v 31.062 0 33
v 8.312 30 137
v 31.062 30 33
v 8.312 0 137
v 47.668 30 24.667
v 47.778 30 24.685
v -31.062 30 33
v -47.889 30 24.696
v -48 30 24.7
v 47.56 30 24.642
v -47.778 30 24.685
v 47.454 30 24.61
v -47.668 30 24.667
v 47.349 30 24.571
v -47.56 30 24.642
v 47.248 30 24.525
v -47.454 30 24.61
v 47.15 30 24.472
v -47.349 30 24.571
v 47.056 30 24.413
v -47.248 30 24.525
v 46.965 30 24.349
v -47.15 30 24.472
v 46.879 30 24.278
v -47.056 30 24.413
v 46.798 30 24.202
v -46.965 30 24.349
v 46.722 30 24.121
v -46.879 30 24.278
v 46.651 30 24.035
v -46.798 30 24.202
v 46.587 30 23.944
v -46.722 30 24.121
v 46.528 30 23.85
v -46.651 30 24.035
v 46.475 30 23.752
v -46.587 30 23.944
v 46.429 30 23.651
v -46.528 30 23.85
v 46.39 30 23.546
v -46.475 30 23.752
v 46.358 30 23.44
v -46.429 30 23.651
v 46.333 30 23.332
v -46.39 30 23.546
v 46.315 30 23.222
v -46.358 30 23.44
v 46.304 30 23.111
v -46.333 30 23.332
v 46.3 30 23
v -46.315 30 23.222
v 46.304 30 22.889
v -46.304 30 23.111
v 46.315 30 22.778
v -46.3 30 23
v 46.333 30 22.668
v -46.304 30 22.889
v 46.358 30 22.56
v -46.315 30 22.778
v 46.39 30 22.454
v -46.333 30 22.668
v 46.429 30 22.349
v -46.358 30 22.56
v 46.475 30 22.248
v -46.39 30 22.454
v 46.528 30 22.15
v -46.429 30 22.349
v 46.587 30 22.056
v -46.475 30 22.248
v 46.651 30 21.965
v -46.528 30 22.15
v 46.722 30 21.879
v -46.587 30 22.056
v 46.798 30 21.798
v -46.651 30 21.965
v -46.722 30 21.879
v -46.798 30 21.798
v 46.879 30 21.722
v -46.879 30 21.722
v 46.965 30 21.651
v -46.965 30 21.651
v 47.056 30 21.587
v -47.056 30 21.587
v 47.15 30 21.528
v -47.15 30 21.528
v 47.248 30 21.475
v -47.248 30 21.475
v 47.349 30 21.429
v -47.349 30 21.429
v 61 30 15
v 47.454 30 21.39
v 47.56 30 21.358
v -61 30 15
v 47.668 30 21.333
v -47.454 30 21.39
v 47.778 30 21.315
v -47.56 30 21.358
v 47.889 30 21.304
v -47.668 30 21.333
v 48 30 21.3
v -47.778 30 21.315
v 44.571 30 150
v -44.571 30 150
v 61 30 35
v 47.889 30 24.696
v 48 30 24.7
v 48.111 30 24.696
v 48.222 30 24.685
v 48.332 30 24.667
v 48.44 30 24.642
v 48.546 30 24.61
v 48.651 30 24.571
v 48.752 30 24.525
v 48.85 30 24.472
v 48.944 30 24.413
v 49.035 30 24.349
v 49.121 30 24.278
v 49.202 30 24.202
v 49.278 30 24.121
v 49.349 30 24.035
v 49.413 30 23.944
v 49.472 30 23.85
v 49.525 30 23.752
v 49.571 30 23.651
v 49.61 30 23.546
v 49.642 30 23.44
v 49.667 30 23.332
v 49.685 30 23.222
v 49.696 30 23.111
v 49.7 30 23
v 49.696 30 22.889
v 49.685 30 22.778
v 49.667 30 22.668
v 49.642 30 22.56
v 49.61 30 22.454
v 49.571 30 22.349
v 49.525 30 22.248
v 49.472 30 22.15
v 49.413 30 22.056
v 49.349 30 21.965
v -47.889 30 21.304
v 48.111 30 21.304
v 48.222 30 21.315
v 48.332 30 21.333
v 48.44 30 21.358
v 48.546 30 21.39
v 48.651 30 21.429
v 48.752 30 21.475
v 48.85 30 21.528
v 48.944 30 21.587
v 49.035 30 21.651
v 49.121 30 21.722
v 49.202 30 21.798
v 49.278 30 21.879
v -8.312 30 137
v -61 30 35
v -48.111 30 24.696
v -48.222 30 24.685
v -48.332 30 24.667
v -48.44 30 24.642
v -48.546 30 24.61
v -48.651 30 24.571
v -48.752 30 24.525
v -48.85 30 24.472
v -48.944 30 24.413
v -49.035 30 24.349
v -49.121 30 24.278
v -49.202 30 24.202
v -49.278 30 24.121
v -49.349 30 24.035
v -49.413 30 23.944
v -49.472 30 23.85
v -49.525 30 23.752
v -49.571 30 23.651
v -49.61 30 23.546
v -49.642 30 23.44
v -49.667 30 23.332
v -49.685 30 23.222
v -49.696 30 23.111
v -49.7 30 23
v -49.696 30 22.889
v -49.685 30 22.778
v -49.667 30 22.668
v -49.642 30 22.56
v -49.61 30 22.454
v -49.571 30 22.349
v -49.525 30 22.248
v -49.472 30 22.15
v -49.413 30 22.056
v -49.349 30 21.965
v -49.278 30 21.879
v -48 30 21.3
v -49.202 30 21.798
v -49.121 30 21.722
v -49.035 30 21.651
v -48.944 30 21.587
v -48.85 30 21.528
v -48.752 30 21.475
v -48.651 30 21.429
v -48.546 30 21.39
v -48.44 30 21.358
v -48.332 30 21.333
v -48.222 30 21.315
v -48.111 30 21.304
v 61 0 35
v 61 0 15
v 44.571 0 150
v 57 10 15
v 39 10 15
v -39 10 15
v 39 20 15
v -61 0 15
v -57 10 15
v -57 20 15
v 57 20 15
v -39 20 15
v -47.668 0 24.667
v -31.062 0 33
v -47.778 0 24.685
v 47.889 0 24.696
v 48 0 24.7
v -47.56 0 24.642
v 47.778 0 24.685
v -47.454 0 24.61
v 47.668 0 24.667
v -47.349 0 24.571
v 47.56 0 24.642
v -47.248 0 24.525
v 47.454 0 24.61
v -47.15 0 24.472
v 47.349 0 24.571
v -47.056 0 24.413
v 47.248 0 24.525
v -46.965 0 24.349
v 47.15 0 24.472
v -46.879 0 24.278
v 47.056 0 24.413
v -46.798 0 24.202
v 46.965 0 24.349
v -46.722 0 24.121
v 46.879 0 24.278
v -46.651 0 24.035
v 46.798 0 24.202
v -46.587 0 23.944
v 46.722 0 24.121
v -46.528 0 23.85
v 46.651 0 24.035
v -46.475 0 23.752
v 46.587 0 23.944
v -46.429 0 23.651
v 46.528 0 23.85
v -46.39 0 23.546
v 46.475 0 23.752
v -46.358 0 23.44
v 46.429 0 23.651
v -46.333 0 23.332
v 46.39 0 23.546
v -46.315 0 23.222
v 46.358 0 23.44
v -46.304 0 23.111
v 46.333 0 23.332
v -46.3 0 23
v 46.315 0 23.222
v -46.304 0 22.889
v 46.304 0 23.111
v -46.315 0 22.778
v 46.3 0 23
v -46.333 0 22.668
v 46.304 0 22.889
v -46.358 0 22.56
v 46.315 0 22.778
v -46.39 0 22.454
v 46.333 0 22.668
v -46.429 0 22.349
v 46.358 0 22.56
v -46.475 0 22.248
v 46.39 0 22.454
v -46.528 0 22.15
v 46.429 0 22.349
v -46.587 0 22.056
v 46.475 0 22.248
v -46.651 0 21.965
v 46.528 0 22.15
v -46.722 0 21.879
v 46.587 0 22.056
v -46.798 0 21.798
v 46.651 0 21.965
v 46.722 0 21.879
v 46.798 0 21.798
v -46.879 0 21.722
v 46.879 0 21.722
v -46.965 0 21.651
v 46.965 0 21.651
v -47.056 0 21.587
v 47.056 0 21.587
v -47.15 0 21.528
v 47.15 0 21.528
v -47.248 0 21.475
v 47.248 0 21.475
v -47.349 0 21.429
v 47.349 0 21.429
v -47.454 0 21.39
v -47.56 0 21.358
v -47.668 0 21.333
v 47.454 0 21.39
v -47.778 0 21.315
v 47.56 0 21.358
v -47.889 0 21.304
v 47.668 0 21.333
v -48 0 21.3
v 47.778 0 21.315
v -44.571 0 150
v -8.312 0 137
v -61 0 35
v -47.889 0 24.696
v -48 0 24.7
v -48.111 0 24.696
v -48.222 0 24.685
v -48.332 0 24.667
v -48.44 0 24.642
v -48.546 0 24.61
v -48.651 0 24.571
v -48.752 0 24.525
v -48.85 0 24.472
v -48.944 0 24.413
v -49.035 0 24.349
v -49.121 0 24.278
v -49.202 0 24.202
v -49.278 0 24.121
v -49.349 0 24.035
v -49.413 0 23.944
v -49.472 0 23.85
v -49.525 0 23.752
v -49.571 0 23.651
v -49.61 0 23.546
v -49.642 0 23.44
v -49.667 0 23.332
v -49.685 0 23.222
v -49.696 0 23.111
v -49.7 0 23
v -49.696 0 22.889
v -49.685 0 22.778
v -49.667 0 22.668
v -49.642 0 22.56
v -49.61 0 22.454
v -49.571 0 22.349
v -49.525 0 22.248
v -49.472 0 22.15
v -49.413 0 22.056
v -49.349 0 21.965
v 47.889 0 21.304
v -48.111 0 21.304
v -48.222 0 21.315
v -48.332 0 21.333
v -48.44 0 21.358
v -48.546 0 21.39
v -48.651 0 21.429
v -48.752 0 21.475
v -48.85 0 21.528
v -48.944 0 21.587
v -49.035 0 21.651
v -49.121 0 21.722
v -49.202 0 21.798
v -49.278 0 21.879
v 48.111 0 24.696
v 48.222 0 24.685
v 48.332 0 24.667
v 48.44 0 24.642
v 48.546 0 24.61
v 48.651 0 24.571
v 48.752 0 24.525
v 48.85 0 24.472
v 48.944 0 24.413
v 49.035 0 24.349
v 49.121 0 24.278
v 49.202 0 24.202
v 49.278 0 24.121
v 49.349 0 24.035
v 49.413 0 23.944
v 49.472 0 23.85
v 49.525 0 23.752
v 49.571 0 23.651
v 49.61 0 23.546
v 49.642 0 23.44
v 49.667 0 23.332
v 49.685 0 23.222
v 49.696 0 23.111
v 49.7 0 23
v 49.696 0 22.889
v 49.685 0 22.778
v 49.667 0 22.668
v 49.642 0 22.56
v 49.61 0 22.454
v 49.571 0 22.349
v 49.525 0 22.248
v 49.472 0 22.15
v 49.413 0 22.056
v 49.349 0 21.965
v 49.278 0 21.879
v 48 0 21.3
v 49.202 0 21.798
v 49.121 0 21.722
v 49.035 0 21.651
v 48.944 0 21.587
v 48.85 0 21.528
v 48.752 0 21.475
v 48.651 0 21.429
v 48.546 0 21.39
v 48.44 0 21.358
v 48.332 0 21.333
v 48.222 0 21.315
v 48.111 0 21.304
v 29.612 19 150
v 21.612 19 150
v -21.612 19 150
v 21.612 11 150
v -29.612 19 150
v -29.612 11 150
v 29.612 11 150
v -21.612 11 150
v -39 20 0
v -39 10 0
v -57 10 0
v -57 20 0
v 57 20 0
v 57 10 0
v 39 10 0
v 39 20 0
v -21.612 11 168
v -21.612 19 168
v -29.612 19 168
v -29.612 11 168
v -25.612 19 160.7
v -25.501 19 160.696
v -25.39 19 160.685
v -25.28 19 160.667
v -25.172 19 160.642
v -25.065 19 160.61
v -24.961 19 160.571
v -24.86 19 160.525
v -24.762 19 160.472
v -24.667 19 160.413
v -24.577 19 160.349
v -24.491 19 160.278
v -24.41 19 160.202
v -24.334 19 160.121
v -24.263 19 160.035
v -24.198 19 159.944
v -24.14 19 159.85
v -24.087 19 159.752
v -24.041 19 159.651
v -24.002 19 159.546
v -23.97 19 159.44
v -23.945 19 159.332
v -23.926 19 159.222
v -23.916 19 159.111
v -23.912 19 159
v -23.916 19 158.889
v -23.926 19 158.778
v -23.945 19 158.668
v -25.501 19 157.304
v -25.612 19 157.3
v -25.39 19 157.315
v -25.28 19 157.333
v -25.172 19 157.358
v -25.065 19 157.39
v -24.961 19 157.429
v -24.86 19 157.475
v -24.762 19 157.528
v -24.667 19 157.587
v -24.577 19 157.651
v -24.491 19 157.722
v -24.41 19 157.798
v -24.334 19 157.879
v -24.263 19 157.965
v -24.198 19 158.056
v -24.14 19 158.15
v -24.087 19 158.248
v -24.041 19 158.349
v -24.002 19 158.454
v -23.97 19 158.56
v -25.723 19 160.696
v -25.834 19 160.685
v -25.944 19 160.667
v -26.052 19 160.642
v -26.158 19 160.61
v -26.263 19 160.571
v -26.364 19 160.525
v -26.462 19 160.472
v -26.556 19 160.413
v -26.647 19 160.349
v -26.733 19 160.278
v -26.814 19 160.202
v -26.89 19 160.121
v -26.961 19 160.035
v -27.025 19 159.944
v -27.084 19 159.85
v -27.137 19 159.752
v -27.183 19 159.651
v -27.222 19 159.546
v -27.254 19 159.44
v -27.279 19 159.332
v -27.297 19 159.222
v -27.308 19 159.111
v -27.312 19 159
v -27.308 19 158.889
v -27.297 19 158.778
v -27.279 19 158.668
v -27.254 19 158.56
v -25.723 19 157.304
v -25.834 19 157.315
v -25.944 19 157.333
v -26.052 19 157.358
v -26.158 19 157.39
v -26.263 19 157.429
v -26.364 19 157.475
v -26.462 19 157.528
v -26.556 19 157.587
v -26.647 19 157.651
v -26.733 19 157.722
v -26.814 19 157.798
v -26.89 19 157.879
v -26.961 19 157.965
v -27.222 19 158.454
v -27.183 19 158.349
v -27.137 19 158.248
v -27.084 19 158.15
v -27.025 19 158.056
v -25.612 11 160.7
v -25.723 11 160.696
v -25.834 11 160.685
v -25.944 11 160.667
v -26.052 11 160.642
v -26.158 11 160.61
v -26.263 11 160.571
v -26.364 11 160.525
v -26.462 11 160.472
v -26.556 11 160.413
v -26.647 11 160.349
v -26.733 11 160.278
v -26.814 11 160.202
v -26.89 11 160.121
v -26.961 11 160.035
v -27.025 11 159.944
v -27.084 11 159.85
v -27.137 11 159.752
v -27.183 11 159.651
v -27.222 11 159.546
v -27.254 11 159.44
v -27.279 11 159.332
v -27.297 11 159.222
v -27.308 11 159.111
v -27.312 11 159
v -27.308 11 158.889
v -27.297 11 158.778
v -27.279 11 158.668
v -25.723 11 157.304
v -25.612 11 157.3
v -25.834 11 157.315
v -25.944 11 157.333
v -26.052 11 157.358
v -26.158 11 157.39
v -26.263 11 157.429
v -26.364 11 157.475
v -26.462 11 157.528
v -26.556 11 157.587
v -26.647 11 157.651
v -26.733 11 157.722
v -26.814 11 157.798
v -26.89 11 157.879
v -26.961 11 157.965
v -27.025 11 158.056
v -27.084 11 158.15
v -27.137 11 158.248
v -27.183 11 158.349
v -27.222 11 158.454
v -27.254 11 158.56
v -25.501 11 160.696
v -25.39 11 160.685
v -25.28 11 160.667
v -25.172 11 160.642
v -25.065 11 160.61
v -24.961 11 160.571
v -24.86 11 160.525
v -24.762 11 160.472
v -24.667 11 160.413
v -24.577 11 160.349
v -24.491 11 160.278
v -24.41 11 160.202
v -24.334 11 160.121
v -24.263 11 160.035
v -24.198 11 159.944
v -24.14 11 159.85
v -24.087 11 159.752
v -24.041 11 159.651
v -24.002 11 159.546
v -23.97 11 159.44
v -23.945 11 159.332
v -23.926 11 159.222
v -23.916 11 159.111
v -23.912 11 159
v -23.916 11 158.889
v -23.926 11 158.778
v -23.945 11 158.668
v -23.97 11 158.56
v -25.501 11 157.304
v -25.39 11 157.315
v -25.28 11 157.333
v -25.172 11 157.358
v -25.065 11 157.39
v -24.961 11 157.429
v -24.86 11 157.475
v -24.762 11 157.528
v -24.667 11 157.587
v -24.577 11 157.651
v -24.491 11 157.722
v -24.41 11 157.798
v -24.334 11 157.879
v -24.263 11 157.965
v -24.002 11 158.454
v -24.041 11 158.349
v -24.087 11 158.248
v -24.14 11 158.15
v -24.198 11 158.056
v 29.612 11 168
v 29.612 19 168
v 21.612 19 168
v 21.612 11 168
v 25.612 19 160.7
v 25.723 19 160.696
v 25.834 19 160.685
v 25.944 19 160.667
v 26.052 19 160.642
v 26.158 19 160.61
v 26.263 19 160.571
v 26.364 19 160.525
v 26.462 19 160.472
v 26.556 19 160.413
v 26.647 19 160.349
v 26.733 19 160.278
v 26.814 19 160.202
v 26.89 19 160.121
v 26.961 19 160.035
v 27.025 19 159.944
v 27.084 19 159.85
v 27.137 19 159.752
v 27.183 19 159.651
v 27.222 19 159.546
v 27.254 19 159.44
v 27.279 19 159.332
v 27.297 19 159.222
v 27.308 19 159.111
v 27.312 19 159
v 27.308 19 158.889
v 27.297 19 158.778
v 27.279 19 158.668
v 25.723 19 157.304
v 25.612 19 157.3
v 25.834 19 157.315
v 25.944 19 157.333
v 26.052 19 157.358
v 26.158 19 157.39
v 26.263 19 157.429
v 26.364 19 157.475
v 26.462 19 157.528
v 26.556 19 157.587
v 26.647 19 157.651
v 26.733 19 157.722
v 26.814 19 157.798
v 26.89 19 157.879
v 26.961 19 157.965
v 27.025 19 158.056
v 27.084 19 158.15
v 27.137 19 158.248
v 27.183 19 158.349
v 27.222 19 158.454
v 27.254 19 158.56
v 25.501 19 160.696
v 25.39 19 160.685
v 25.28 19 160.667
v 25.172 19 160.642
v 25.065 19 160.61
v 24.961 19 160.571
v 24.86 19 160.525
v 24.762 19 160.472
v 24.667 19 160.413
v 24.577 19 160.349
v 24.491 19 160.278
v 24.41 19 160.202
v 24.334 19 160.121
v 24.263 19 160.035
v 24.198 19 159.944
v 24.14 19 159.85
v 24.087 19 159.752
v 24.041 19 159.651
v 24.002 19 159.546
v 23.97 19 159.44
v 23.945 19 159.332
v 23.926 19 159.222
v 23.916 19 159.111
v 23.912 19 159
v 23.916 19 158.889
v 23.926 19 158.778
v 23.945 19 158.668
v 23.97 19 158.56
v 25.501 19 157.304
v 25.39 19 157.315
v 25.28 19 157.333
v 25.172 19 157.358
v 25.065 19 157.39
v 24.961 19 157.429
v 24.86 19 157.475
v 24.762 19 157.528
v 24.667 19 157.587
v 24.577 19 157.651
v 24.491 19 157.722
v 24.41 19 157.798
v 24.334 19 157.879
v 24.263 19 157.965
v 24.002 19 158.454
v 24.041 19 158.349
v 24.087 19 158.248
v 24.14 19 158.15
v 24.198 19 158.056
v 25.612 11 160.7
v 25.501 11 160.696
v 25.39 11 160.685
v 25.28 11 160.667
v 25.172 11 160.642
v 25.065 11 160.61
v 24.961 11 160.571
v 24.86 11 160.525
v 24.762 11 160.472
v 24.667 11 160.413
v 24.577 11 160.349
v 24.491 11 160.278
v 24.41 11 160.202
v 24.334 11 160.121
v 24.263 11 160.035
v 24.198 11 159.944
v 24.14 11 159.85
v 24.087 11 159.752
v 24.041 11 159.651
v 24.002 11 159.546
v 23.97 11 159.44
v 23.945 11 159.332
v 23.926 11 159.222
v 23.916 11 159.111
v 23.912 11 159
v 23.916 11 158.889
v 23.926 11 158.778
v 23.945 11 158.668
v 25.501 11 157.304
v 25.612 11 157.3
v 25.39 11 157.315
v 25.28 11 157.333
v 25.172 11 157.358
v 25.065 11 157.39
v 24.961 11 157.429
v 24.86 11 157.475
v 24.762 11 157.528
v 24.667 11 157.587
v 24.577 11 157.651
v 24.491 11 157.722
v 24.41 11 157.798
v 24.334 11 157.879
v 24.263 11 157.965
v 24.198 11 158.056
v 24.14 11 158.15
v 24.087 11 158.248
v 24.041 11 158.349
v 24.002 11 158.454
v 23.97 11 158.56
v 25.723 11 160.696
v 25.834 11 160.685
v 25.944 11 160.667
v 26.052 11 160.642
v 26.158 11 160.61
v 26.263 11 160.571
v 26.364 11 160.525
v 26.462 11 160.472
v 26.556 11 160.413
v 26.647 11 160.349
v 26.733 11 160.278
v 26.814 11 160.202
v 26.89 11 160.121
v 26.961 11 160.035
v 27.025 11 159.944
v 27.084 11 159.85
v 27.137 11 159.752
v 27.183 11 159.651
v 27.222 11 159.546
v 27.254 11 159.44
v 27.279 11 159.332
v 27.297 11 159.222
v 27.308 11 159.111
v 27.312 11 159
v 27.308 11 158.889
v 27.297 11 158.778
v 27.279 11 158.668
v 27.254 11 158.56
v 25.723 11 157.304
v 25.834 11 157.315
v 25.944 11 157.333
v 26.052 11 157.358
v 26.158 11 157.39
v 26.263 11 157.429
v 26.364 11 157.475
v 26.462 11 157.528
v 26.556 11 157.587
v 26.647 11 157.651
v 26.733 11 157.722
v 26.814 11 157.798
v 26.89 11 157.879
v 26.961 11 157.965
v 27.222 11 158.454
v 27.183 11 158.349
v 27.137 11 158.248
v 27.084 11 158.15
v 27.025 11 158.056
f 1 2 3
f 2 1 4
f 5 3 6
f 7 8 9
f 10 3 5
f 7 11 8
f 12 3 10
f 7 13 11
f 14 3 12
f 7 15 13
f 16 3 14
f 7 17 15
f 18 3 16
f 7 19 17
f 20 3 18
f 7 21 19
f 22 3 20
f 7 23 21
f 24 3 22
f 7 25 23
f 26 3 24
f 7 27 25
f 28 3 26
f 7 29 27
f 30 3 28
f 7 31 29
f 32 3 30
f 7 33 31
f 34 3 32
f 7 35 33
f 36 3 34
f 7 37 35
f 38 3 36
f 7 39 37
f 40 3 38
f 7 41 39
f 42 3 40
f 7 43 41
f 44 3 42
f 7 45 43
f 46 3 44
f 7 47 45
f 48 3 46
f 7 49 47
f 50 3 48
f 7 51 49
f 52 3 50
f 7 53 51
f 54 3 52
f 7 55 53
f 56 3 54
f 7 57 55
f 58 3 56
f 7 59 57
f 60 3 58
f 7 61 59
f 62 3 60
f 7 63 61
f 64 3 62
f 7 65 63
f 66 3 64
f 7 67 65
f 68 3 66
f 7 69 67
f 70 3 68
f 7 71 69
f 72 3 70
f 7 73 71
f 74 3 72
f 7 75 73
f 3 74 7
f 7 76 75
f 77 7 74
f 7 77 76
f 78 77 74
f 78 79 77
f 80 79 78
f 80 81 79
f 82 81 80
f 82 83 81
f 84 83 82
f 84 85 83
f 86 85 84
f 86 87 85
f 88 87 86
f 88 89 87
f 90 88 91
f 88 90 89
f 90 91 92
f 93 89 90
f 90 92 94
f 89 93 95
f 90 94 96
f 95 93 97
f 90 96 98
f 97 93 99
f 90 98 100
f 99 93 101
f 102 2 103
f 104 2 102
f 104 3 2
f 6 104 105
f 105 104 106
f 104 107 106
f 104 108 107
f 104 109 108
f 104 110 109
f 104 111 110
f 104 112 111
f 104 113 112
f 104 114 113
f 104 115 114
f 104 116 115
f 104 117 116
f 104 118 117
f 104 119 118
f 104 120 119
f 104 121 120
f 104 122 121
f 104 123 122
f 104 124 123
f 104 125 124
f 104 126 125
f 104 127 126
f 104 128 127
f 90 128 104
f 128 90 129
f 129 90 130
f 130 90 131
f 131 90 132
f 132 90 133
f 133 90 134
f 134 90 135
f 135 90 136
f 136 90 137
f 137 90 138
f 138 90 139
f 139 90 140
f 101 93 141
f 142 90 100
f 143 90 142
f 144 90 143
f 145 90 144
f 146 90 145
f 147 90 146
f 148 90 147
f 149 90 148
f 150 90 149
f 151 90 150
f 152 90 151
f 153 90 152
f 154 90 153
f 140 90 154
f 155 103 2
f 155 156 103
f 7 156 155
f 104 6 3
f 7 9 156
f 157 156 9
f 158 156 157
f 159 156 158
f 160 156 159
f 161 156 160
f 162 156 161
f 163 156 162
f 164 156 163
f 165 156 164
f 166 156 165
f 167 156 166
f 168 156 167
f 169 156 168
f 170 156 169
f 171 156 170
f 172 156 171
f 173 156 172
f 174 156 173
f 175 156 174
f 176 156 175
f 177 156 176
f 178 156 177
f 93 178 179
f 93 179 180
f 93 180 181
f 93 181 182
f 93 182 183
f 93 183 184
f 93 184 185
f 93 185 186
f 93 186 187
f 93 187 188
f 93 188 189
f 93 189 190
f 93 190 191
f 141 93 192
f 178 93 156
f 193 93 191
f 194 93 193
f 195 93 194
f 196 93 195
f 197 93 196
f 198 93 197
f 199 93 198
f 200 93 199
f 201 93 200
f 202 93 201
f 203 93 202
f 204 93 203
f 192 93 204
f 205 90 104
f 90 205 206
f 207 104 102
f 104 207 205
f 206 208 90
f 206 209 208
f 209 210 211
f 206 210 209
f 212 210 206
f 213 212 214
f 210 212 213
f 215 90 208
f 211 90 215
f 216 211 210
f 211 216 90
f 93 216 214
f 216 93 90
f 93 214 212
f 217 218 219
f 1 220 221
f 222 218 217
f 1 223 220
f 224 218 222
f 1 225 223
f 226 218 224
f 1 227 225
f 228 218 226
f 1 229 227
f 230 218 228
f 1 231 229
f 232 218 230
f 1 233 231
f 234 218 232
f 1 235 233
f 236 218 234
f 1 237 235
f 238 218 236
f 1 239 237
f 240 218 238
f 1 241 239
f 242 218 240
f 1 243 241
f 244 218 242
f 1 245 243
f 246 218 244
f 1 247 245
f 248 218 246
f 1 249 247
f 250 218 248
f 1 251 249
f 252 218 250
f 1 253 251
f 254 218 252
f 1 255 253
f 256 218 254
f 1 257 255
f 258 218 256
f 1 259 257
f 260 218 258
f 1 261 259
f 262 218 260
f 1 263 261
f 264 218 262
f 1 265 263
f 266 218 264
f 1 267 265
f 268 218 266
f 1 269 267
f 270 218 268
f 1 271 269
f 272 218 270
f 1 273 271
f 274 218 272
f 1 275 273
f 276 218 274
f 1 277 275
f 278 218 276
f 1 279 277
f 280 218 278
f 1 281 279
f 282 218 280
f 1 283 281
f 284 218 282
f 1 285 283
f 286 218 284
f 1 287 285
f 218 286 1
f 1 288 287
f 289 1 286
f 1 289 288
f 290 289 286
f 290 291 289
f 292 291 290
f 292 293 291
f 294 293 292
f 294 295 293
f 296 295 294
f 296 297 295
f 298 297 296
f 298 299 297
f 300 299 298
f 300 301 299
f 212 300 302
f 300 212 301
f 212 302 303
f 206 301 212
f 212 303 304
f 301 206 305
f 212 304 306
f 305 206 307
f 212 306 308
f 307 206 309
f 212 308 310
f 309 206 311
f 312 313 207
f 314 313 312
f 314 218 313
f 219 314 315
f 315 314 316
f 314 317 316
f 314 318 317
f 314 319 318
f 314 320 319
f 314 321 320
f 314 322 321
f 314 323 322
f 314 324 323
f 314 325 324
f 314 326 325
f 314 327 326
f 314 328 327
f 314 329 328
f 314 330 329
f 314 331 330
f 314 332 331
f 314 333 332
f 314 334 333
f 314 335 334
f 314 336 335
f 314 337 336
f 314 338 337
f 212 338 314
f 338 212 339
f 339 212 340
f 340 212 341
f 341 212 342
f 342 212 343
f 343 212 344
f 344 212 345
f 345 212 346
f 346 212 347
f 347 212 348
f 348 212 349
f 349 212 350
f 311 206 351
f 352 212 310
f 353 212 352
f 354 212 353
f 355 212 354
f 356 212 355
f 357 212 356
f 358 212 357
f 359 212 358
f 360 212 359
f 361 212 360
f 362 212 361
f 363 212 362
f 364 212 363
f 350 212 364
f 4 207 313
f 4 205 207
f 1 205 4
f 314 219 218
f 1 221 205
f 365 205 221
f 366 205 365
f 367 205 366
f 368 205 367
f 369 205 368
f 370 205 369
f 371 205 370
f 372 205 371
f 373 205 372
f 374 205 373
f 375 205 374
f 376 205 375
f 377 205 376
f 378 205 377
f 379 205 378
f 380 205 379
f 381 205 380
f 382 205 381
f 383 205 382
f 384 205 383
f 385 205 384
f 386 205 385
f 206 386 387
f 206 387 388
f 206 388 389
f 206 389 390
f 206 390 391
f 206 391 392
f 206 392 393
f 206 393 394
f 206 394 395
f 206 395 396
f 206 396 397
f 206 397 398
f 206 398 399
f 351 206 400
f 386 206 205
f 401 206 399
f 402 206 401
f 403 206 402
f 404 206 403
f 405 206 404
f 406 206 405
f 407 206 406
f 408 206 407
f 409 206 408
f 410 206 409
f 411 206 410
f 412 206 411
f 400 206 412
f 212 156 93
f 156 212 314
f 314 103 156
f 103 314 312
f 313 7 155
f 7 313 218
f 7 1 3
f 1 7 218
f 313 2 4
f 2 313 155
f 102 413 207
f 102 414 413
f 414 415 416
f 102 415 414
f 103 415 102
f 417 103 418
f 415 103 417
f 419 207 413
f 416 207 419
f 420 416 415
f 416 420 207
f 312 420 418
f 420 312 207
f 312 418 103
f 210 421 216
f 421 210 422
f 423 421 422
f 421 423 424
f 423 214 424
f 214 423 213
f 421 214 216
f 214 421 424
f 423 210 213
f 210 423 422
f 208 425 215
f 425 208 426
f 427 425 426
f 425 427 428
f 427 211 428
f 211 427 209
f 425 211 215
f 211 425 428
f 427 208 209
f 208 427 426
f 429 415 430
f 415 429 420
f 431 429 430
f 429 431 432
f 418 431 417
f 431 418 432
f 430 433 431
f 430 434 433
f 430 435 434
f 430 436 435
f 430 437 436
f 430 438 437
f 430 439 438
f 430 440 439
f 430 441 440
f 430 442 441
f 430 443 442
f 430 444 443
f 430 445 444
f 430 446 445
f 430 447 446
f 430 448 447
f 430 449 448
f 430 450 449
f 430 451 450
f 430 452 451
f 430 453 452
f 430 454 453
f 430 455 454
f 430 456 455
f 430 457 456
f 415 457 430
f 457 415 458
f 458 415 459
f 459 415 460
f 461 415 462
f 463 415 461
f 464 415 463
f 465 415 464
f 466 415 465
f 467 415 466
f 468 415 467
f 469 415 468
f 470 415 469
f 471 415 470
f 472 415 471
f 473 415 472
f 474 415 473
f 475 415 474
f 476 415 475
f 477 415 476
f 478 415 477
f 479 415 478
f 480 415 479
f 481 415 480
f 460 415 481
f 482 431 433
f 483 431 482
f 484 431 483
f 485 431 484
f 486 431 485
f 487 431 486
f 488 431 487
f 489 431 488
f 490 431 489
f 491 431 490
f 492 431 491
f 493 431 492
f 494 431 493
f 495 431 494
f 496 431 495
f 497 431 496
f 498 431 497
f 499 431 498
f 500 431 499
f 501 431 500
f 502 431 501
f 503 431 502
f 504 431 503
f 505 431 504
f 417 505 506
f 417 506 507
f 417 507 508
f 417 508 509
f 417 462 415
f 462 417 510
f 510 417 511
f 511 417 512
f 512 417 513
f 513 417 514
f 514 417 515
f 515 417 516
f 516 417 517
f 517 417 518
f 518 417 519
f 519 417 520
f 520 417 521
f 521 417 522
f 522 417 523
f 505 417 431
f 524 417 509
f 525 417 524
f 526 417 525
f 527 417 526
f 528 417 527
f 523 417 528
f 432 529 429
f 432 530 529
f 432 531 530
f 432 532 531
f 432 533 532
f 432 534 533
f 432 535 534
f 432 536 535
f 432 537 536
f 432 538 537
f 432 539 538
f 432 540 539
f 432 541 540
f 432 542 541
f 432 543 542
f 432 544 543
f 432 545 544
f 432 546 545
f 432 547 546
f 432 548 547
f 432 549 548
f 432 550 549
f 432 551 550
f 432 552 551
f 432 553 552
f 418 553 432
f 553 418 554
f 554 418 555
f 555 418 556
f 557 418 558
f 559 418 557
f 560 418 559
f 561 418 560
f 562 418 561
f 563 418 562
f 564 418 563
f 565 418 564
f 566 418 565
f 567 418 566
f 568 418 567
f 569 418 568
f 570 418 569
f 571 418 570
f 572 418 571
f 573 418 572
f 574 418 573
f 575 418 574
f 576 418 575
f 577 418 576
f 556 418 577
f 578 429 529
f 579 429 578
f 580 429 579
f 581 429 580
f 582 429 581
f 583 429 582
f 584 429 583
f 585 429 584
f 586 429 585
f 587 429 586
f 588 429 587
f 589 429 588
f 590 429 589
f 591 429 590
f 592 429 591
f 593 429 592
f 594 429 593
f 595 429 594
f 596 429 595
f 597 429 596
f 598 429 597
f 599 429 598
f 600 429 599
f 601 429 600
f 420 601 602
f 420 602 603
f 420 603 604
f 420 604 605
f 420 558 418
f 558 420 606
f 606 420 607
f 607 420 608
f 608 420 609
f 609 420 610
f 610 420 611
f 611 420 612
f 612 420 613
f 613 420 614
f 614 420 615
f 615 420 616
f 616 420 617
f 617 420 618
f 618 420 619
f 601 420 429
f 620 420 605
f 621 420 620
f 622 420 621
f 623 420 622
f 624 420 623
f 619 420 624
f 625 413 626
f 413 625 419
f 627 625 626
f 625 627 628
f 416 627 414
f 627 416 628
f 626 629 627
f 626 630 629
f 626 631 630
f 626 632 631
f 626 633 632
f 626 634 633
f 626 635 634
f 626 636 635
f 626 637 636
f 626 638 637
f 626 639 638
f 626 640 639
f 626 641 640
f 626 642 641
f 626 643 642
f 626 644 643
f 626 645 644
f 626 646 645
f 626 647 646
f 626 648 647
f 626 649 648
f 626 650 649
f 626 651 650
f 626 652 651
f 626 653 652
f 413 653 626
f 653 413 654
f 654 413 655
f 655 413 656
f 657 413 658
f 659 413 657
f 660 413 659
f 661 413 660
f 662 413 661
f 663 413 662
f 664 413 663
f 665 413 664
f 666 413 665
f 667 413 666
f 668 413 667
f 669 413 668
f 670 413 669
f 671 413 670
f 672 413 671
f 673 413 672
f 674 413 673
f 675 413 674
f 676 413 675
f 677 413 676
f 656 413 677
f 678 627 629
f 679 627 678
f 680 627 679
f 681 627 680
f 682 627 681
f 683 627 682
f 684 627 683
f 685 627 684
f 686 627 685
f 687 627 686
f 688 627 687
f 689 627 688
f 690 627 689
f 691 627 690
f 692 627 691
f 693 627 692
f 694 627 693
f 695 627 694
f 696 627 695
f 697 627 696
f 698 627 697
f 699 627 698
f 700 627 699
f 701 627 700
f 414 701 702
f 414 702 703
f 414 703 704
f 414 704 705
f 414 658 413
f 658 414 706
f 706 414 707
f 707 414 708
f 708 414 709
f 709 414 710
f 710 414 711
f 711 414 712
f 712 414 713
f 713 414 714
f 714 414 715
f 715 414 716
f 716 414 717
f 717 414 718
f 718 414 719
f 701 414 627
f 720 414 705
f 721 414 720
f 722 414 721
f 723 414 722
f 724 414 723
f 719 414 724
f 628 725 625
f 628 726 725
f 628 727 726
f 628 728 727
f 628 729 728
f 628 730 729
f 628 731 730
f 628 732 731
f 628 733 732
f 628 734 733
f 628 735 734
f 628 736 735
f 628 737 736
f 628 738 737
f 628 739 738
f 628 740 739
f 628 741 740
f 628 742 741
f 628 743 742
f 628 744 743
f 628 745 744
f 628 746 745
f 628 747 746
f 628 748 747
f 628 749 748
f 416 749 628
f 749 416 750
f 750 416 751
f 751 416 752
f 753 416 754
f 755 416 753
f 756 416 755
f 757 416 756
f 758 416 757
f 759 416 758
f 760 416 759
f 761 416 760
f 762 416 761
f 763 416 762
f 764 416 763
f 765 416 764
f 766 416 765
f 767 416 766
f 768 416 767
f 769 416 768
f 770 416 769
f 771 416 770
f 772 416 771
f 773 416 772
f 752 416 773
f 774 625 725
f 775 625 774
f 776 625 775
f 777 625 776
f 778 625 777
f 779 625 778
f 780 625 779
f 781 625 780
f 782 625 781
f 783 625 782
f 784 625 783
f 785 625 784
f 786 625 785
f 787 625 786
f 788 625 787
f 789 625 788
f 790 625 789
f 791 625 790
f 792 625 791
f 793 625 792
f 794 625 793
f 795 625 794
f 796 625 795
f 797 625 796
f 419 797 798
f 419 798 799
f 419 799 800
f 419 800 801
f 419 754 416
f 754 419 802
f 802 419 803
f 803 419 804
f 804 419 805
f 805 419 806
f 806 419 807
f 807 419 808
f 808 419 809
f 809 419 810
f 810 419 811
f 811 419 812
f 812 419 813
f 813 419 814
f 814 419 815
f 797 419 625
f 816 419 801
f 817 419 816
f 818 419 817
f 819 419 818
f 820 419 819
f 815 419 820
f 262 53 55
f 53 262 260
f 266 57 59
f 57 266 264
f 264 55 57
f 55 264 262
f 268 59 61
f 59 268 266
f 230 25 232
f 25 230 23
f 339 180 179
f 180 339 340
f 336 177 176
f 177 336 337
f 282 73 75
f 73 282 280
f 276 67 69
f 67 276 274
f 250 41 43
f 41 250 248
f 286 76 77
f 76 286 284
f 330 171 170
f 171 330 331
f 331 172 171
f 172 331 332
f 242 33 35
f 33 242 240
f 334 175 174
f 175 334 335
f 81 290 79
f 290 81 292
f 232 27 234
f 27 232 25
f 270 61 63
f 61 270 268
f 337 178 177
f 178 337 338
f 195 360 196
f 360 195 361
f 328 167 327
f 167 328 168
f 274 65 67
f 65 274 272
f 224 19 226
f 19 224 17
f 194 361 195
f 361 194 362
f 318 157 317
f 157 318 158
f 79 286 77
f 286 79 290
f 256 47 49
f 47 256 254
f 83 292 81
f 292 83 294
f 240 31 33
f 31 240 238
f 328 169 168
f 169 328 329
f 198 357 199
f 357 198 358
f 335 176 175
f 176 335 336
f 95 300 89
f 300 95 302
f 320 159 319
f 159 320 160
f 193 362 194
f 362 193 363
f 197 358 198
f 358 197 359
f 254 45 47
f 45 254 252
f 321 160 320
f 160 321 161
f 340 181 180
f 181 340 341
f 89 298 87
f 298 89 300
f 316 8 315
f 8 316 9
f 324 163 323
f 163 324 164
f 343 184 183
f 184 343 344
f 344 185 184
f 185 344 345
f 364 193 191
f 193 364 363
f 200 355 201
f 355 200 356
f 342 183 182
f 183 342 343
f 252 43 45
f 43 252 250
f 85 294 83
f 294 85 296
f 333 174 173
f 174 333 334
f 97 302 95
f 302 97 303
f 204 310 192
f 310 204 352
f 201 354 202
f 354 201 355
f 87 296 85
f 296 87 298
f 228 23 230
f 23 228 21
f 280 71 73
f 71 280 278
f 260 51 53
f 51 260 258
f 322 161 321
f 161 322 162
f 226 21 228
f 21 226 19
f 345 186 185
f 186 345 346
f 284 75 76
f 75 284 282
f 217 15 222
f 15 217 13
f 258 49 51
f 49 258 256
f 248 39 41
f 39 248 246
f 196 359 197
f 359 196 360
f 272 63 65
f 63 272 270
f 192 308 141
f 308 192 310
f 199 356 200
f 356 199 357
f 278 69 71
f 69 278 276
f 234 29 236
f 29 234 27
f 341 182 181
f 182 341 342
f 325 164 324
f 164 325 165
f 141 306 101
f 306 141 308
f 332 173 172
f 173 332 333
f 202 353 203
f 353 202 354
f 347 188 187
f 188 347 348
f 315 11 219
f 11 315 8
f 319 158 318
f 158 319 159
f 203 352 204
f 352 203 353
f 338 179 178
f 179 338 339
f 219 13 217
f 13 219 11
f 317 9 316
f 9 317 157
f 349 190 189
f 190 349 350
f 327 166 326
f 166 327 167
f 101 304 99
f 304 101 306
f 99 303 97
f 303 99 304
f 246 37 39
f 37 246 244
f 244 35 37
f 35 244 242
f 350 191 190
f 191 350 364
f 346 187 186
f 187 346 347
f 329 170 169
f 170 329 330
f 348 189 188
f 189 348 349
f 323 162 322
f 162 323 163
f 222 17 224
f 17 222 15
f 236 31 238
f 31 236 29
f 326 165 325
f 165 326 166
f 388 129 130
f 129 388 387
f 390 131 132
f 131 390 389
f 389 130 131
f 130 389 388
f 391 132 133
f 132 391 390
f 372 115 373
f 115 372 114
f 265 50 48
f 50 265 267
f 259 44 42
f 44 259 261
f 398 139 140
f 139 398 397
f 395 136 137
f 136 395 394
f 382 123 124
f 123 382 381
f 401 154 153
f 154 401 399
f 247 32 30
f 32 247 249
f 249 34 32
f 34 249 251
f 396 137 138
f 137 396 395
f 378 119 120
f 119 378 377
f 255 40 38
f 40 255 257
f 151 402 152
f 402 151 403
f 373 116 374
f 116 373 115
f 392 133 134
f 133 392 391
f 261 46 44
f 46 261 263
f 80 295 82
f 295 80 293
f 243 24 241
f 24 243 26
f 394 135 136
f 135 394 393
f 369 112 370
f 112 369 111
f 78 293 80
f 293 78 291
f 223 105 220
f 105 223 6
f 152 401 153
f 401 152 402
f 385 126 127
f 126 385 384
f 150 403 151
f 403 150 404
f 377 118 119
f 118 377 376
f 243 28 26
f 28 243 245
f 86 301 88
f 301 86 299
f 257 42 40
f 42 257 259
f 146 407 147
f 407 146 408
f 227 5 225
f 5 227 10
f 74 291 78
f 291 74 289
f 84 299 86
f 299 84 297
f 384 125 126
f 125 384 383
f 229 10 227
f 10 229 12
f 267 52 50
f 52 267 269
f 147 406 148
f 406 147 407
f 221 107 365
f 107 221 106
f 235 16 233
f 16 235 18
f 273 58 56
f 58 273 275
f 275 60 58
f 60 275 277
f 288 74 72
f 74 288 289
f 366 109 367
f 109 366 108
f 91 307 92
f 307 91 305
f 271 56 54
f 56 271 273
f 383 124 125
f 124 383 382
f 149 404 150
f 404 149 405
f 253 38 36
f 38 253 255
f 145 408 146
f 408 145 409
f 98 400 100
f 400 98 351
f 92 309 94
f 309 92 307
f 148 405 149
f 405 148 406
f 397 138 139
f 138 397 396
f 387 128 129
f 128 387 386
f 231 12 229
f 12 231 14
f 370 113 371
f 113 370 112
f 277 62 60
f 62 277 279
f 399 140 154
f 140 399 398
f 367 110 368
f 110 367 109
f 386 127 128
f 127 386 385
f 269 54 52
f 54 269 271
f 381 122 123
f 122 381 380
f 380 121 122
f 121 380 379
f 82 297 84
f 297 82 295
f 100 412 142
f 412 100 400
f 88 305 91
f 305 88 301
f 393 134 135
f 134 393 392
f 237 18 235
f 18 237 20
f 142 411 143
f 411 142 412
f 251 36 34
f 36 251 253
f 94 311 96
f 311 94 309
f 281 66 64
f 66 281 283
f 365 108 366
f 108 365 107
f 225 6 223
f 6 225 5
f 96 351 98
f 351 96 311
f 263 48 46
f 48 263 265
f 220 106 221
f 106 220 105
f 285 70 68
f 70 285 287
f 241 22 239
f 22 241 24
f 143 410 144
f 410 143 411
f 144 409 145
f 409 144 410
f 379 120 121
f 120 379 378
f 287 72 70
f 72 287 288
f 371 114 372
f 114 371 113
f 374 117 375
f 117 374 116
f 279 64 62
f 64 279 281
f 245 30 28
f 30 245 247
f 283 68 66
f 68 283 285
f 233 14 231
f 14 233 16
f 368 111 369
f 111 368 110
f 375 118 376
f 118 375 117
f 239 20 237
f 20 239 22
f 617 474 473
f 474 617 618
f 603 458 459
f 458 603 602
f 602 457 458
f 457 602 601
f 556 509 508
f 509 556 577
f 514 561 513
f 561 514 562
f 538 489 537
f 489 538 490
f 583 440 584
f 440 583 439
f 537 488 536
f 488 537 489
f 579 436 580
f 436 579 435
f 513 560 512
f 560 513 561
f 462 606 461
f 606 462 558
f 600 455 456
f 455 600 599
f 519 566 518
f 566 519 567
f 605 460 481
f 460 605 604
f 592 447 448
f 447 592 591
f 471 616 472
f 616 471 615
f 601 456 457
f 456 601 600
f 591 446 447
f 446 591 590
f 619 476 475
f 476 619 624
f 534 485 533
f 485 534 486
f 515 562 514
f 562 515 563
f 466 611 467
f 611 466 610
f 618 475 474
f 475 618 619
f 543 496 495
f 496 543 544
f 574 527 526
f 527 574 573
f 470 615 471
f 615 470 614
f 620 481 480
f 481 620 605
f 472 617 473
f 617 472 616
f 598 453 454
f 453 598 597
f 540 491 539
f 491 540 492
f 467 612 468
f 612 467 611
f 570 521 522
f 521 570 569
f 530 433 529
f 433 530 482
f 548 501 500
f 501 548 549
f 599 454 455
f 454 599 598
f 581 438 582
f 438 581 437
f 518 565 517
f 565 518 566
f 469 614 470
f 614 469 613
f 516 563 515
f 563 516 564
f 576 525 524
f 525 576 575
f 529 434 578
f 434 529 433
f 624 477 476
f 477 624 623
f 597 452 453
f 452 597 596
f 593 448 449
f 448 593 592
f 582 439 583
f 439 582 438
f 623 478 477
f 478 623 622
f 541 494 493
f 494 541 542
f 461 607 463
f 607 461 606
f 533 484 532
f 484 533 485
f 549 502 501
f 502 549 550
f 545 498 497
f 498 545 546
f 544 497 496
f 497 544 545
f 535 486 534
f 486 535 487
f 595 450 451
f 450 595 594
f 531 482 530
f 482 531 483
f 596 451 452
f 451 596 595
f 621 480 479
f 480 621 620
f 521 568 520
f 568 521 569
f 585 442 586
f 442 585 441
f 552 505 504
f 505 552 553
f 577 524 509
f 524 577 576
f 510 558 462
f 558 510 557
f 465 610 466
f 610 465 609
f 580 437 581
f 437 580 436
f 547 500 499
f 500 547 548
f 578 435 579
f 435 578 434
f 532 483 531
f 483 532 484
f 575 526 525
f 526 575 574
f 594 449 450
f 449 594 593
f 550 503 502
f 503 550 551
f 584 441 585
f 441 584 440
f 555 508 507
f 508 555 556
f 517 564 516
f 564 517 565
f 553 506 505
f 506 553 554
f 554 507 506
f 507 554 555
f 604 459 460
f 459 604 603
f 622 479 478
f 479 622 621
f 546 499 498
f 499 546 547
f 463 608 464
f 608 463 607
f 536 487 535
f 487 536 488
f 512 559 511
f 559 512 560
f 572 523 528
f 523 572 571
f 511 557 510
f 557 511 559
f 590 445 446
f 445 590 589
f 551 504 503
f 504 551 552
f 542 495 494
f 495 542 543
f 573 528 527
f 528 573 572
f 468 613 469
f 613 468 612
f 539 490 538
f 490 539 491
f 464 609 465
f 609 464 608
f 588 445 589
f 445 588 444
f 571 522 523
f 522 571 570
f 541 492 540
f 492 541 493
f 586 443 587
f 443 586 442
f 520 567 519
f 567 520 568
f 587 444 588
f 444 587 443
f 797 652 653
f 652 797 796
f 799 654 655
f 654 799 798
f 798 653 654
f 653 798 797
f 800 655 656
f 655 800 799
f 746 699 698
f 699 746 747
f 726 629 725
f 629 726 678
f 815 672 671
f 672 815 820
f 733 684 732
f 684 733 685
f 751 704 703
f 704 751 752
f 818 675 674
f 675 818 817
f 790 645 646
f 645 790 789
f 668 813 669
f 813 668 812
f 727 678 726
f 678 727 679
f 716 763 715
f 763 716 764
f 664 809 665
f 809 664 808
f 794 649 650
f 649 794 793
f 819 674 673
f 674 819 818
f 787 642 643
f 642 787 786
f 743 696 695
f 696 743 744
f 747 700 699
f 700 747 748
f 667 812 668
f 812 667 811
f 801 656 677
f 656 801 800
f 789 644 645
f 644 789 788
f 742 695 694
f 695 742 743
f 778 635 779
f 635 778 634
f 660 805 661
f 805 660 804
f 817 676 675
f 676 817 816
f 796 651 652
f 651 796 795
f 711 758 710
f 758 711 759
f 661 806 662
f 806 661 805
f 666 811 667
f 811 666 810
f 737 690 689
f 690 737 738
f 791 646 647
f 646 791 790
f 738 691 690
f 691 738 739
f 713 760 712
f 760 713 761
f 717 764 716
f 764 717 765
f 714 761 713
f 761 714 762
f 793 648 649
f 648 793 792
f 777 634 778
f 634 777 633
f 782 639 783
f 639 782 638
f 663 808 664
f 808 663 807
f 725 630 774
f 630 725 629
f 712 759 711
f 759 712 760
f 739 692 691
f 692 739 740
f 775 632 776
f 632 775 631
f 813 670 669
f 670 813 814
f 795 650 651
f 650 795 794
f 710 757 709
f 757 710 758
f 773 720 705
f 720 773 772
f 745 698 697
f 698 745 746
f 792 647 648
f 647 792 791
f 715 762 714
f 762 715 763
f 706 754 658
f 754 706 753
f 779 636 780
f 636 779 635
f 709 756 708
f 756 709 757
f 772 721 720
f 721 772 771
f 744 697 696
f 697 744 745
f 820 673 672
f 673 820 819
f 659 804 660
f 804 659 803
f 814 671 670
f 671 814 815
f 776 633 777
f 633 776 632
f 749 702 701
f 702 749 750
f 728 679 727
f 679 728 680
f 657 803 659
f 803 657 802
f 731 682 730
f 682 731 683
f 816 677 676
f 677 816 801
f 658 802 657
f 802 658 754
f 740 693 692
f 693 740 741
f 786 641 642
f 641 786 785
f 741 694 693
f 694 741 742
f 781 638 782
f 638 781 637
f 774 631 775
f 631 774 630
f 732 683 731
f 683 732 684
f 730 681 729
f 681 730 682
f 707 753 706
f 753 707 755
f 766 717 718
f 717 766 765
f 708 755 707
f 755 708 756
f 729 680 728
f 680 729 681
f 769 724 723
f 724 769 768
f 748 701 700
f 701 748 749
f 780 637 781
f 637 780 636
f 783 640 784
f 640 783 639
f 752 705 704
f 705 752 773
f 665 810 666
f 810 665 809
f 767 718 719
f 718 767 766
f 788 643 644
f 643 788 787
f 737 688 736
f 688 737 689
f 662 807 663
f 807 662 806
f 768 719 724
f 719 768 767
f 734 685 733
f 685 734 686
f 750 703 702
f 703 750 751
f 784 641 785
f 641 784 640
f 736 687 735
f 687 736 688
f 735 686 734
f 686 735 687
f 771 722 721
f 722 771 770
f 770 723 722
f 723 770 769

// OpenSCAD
// file: ../lib/dovetail.scad
// lib/dovetail.scad
// Shared joinery modules: dovetail tenon/mortise, M3 insert boss, rounded box.
// Depends on values in params.scad (include it in the calling file).

// A dovetail tenon: a flared prism that grows wider toward its tip so it locks
// against a matching mortise when slid in along +y.
//   len   : protrusion length (along +y)
//   base_w: width at the root (x, near the part)
//   tip_w : width at the tip (x, wider -> self locking)
//   h     : height (z)
// Literal defaults keep this library self-contained under `use <>` (which does
// not import the caller's params). Callers pass explicit sizes where needed.
module dovetail_tenon(len = 8, base_w = 8, tip_w = 12, h = 10) {
    linear_extrude(height = h)
        polygon(points = [
            [-base_w/2, 0],
            [ base_w/2, 0],
            [ tip_w/2,  len],
            [-tip_w/2,  len],
        ]);
}

// Matching mortise volume (subtract this). Enlarged by tol_dovetail per side.
module dovetail_mortise(len = 8, base_w = 8, tip_w = 12, h = 10, clr = 0.15) {
    // extend slightly beyond both faces so the cut is clean
    translate([0, -0.01, -0.01])
        linear_extrude(height = h + 0.02)
            polygon(points = [
                [-(base_w/2 + clr), 0],
                [ (base_w/2 + clr), 0],
                [ (tip_w/2 + clr),  len + 0.02],
                [-(tip_w/2 + clr),  len + 0.02],
            ]);
}

// Cylindrical boss with a blind hole for a heat-set insert.
//   boss_d : outer diameter of the boss
//   boss_h : height
//   hole_d : insert press-hole diameter (params: m3_insert)
//   hole_depth : blind hole depth (0 = through)
module insert_boss(boss_d = 8, boss_h = 8, hole_d = 4.0, hole_depth = 0) {
    difference() {
        cylinder(d = boss_d, h = boss_h);
        translate([0, 0, hole_depth == 0 ? -0.01 : boss_h - hole_depth])
            cylinder(d = hole_d, h = hole_depth == 0 ? boss_h + 0.02 : hole_depth + 0.01);
    }
}

// Rounded rectangular box shell (open top) used by gondola / recesses.
module rounded_box(x, y, z, r = 2) {
    hull() {
        for (sx = [-1, 1], sy = [-1, 1])
            translate([sx * (x/2 - r), sy * (y/2 - r), 0])
                cylinder(r = r, h = z);
    }
}

// A simple rectangular slot cutter (for tabs), centered on x, open along z.
module slot(w, t, d) {
    translate([-w/2, -t/2, -0.01])
        cube([w, t, d + 0.02]);
}
// main file
// ferris/tower.scad
// A-frame support post, total height 280, printed in two halves.
//   part = "lower" : feet (base slot tabs + M3 thumbscrew) + splice dowels (male)
//   part = "upper" : apex with 608 bearing pocket + splice sockets (female)
//   part = "upper-motor" : v7 (9/3) = "upper" + 4 x M3 pilot holes on the OUTER
//                  apex face for the motor bracket (motor_mount.scad). Print
//                  ONE of these for the motor-side (former crank-side) tower;
//                  the other tower keeps the plain "upper".
// Select at CLI:  openscad -D 'part="upper"' -o tower-upper.stl tower.scad
// Splice = square dowel + M3 x2 (one per leg). Bearing axis is Y (toward wheel).

include <../params.scad>;
use <../lib/dovetail.scad>;

part = "lower";               // overridden from the Makefile

depth    = 30;                // Y depth of the frame
foot_x   = 48;               // foot centre offset
foot_zc  = 10;
apex_zc  = tower_total_h - 22;   // 258, apex block centre
split_z  = 135;              // horizontal split plane (keeps both halves <=170)
// leg centreline x at the split (linear foot->apex interpolation)
split_x  = foot_x + (0 - foot_x) * (split_z - foot_zc) / (apex_zc - foot_zc);
dowel    = splice_dowel;     // 8 mm square dowel
boss_d   = bearing_d + 8;    // 30 mm bearing boss

module leg(sx) {
    hull() {
        translate([sx * foot_x, depth/2, foot_zc]) cube([26, depth, 20], center = true);
        translate([0, depth/2, apex_zc])           cube([42, depth, 44], center = true);
    }
}

module frame_solid() {
    leg(1); leg(-1);
    // base crossbar between feet
    translate([-foot_x, 0, 0]) cube([foot_x * 2, depth, 18]);
    // mid crossbar for A-frame rigidity (stays in the lower half)
    translate([-30, 0, 122]) cube([60, depth, 16]);
    // apex bearing boss (axis Y)
    translate([0, 0, apex_zc]) rotate([-90, 0, 0]) cylinder(d = boss_d, h = depth);
}

module bearing_features() {
    // subtract from the inner face (y = depth) going outward
    translate([0, depth + 0.01, apex_zc]) rotate([90, 0, 0]) {
        cylinder(d = bearing_d - 2 * bearing_lip, h = 1.2 + 0.02);           // lip mouth
        cylinder(d = bearing_d, h = bearing_h + 1.2);                        // bearing pocket
    }
    // shaft through bore
    translate([0, -1, apex_zc]) rotate([-90, 0, 0]) cylinder(d = bearing_bore, h = depth + 2);
}

module foot_tabs() {
    for (sx = [-1, 1])
        translate([sx * foot_x - foot_tab_w/2, depth/2 - foot_tab_t/2, -foot_tab_h])
            cube([foot_tab_w, foot_tab_t, foot_tab_h + 2]);
}

module thumb_holes() {
    for (sx = [-1, 1])
        translate([sx * foot_x, -1, 8]) rotate([-90, 0, 0])
            cylinder(d = thumb_hole_d, h = depth + 2);
}

module splice_dowels_male() {
    for (sx = [-1, 1])
        translate([sx * split_x, depth/2, split_z])
            translate([-dowel/2, -dowel/2, 0]) cube([dowel, dowel, 18]);
}

module splice_sockets() {
    for (sx = [-1, 1])
        translate([sx * split_x, depth/2, split_z - 0.01])
            translate([-(dowel + tol)/2, -(dowel + tol)/2, 0])
                cube([dowel + tol, dowel + tol, 20]);
}

module splice_bolts() {
    for (sx = [-1, 1])
        translate([sx * split_x, -1, split_z + 9]) rotate([-90, 0, 0])
            cylinder(d = m3_clear, h = depth + 2);
}

module motor_pilots() {
    // 4 x Ø2.9 self-tap pilots from the OUTER face (local y = 0) into the apex
    // block, on the (±14, ±14) square around the shaft axis (mb_tower_hole_*).
    for (sx = [-1, 1], sz = [-1, 1])
        translate([sx * mb_tower_hole_x, -1, apex_zc + sz * mb_tower_hole_z])
            rotate([-90, 0, 0]) cylinder(d = m3_thread, h = mb_tower_pilot_depth + 1, $fn = 24);
}

module tower(part) {
    // #18: ground each half to z=0 for a print-ready STL (was modelled in the
    // assembled position). Lower feet-tabs down; upper sits on its split face.
    if (part == "lower") {
        translate([0, 0, foot_tab_h])
        difference() {
            union() {
                intersection() {
                    frame_solid();
                    translate([-100, -1, -foot_tab_h - 1]) cube([200, depth + 2, split_z + foot_tab_h + 1]);
                }
                foot_tabs();
                splice_dowels_male();
            }
            thumb_holes();
            splice_bolts();
        }
    } else {
        translate([0, 0, -split_z])
        difference() {
            intersection() {
                frame_solid();
                translate([-100, -1, split_z]) cube([200, depth + 2, tower_total_h - split_z + 2]);
            }
            bearing_features();
            splice_sockets();
            splice_bolts();
            if (part == "upper-motor") motor_pilots();
        }
    }
}

tower(part);
